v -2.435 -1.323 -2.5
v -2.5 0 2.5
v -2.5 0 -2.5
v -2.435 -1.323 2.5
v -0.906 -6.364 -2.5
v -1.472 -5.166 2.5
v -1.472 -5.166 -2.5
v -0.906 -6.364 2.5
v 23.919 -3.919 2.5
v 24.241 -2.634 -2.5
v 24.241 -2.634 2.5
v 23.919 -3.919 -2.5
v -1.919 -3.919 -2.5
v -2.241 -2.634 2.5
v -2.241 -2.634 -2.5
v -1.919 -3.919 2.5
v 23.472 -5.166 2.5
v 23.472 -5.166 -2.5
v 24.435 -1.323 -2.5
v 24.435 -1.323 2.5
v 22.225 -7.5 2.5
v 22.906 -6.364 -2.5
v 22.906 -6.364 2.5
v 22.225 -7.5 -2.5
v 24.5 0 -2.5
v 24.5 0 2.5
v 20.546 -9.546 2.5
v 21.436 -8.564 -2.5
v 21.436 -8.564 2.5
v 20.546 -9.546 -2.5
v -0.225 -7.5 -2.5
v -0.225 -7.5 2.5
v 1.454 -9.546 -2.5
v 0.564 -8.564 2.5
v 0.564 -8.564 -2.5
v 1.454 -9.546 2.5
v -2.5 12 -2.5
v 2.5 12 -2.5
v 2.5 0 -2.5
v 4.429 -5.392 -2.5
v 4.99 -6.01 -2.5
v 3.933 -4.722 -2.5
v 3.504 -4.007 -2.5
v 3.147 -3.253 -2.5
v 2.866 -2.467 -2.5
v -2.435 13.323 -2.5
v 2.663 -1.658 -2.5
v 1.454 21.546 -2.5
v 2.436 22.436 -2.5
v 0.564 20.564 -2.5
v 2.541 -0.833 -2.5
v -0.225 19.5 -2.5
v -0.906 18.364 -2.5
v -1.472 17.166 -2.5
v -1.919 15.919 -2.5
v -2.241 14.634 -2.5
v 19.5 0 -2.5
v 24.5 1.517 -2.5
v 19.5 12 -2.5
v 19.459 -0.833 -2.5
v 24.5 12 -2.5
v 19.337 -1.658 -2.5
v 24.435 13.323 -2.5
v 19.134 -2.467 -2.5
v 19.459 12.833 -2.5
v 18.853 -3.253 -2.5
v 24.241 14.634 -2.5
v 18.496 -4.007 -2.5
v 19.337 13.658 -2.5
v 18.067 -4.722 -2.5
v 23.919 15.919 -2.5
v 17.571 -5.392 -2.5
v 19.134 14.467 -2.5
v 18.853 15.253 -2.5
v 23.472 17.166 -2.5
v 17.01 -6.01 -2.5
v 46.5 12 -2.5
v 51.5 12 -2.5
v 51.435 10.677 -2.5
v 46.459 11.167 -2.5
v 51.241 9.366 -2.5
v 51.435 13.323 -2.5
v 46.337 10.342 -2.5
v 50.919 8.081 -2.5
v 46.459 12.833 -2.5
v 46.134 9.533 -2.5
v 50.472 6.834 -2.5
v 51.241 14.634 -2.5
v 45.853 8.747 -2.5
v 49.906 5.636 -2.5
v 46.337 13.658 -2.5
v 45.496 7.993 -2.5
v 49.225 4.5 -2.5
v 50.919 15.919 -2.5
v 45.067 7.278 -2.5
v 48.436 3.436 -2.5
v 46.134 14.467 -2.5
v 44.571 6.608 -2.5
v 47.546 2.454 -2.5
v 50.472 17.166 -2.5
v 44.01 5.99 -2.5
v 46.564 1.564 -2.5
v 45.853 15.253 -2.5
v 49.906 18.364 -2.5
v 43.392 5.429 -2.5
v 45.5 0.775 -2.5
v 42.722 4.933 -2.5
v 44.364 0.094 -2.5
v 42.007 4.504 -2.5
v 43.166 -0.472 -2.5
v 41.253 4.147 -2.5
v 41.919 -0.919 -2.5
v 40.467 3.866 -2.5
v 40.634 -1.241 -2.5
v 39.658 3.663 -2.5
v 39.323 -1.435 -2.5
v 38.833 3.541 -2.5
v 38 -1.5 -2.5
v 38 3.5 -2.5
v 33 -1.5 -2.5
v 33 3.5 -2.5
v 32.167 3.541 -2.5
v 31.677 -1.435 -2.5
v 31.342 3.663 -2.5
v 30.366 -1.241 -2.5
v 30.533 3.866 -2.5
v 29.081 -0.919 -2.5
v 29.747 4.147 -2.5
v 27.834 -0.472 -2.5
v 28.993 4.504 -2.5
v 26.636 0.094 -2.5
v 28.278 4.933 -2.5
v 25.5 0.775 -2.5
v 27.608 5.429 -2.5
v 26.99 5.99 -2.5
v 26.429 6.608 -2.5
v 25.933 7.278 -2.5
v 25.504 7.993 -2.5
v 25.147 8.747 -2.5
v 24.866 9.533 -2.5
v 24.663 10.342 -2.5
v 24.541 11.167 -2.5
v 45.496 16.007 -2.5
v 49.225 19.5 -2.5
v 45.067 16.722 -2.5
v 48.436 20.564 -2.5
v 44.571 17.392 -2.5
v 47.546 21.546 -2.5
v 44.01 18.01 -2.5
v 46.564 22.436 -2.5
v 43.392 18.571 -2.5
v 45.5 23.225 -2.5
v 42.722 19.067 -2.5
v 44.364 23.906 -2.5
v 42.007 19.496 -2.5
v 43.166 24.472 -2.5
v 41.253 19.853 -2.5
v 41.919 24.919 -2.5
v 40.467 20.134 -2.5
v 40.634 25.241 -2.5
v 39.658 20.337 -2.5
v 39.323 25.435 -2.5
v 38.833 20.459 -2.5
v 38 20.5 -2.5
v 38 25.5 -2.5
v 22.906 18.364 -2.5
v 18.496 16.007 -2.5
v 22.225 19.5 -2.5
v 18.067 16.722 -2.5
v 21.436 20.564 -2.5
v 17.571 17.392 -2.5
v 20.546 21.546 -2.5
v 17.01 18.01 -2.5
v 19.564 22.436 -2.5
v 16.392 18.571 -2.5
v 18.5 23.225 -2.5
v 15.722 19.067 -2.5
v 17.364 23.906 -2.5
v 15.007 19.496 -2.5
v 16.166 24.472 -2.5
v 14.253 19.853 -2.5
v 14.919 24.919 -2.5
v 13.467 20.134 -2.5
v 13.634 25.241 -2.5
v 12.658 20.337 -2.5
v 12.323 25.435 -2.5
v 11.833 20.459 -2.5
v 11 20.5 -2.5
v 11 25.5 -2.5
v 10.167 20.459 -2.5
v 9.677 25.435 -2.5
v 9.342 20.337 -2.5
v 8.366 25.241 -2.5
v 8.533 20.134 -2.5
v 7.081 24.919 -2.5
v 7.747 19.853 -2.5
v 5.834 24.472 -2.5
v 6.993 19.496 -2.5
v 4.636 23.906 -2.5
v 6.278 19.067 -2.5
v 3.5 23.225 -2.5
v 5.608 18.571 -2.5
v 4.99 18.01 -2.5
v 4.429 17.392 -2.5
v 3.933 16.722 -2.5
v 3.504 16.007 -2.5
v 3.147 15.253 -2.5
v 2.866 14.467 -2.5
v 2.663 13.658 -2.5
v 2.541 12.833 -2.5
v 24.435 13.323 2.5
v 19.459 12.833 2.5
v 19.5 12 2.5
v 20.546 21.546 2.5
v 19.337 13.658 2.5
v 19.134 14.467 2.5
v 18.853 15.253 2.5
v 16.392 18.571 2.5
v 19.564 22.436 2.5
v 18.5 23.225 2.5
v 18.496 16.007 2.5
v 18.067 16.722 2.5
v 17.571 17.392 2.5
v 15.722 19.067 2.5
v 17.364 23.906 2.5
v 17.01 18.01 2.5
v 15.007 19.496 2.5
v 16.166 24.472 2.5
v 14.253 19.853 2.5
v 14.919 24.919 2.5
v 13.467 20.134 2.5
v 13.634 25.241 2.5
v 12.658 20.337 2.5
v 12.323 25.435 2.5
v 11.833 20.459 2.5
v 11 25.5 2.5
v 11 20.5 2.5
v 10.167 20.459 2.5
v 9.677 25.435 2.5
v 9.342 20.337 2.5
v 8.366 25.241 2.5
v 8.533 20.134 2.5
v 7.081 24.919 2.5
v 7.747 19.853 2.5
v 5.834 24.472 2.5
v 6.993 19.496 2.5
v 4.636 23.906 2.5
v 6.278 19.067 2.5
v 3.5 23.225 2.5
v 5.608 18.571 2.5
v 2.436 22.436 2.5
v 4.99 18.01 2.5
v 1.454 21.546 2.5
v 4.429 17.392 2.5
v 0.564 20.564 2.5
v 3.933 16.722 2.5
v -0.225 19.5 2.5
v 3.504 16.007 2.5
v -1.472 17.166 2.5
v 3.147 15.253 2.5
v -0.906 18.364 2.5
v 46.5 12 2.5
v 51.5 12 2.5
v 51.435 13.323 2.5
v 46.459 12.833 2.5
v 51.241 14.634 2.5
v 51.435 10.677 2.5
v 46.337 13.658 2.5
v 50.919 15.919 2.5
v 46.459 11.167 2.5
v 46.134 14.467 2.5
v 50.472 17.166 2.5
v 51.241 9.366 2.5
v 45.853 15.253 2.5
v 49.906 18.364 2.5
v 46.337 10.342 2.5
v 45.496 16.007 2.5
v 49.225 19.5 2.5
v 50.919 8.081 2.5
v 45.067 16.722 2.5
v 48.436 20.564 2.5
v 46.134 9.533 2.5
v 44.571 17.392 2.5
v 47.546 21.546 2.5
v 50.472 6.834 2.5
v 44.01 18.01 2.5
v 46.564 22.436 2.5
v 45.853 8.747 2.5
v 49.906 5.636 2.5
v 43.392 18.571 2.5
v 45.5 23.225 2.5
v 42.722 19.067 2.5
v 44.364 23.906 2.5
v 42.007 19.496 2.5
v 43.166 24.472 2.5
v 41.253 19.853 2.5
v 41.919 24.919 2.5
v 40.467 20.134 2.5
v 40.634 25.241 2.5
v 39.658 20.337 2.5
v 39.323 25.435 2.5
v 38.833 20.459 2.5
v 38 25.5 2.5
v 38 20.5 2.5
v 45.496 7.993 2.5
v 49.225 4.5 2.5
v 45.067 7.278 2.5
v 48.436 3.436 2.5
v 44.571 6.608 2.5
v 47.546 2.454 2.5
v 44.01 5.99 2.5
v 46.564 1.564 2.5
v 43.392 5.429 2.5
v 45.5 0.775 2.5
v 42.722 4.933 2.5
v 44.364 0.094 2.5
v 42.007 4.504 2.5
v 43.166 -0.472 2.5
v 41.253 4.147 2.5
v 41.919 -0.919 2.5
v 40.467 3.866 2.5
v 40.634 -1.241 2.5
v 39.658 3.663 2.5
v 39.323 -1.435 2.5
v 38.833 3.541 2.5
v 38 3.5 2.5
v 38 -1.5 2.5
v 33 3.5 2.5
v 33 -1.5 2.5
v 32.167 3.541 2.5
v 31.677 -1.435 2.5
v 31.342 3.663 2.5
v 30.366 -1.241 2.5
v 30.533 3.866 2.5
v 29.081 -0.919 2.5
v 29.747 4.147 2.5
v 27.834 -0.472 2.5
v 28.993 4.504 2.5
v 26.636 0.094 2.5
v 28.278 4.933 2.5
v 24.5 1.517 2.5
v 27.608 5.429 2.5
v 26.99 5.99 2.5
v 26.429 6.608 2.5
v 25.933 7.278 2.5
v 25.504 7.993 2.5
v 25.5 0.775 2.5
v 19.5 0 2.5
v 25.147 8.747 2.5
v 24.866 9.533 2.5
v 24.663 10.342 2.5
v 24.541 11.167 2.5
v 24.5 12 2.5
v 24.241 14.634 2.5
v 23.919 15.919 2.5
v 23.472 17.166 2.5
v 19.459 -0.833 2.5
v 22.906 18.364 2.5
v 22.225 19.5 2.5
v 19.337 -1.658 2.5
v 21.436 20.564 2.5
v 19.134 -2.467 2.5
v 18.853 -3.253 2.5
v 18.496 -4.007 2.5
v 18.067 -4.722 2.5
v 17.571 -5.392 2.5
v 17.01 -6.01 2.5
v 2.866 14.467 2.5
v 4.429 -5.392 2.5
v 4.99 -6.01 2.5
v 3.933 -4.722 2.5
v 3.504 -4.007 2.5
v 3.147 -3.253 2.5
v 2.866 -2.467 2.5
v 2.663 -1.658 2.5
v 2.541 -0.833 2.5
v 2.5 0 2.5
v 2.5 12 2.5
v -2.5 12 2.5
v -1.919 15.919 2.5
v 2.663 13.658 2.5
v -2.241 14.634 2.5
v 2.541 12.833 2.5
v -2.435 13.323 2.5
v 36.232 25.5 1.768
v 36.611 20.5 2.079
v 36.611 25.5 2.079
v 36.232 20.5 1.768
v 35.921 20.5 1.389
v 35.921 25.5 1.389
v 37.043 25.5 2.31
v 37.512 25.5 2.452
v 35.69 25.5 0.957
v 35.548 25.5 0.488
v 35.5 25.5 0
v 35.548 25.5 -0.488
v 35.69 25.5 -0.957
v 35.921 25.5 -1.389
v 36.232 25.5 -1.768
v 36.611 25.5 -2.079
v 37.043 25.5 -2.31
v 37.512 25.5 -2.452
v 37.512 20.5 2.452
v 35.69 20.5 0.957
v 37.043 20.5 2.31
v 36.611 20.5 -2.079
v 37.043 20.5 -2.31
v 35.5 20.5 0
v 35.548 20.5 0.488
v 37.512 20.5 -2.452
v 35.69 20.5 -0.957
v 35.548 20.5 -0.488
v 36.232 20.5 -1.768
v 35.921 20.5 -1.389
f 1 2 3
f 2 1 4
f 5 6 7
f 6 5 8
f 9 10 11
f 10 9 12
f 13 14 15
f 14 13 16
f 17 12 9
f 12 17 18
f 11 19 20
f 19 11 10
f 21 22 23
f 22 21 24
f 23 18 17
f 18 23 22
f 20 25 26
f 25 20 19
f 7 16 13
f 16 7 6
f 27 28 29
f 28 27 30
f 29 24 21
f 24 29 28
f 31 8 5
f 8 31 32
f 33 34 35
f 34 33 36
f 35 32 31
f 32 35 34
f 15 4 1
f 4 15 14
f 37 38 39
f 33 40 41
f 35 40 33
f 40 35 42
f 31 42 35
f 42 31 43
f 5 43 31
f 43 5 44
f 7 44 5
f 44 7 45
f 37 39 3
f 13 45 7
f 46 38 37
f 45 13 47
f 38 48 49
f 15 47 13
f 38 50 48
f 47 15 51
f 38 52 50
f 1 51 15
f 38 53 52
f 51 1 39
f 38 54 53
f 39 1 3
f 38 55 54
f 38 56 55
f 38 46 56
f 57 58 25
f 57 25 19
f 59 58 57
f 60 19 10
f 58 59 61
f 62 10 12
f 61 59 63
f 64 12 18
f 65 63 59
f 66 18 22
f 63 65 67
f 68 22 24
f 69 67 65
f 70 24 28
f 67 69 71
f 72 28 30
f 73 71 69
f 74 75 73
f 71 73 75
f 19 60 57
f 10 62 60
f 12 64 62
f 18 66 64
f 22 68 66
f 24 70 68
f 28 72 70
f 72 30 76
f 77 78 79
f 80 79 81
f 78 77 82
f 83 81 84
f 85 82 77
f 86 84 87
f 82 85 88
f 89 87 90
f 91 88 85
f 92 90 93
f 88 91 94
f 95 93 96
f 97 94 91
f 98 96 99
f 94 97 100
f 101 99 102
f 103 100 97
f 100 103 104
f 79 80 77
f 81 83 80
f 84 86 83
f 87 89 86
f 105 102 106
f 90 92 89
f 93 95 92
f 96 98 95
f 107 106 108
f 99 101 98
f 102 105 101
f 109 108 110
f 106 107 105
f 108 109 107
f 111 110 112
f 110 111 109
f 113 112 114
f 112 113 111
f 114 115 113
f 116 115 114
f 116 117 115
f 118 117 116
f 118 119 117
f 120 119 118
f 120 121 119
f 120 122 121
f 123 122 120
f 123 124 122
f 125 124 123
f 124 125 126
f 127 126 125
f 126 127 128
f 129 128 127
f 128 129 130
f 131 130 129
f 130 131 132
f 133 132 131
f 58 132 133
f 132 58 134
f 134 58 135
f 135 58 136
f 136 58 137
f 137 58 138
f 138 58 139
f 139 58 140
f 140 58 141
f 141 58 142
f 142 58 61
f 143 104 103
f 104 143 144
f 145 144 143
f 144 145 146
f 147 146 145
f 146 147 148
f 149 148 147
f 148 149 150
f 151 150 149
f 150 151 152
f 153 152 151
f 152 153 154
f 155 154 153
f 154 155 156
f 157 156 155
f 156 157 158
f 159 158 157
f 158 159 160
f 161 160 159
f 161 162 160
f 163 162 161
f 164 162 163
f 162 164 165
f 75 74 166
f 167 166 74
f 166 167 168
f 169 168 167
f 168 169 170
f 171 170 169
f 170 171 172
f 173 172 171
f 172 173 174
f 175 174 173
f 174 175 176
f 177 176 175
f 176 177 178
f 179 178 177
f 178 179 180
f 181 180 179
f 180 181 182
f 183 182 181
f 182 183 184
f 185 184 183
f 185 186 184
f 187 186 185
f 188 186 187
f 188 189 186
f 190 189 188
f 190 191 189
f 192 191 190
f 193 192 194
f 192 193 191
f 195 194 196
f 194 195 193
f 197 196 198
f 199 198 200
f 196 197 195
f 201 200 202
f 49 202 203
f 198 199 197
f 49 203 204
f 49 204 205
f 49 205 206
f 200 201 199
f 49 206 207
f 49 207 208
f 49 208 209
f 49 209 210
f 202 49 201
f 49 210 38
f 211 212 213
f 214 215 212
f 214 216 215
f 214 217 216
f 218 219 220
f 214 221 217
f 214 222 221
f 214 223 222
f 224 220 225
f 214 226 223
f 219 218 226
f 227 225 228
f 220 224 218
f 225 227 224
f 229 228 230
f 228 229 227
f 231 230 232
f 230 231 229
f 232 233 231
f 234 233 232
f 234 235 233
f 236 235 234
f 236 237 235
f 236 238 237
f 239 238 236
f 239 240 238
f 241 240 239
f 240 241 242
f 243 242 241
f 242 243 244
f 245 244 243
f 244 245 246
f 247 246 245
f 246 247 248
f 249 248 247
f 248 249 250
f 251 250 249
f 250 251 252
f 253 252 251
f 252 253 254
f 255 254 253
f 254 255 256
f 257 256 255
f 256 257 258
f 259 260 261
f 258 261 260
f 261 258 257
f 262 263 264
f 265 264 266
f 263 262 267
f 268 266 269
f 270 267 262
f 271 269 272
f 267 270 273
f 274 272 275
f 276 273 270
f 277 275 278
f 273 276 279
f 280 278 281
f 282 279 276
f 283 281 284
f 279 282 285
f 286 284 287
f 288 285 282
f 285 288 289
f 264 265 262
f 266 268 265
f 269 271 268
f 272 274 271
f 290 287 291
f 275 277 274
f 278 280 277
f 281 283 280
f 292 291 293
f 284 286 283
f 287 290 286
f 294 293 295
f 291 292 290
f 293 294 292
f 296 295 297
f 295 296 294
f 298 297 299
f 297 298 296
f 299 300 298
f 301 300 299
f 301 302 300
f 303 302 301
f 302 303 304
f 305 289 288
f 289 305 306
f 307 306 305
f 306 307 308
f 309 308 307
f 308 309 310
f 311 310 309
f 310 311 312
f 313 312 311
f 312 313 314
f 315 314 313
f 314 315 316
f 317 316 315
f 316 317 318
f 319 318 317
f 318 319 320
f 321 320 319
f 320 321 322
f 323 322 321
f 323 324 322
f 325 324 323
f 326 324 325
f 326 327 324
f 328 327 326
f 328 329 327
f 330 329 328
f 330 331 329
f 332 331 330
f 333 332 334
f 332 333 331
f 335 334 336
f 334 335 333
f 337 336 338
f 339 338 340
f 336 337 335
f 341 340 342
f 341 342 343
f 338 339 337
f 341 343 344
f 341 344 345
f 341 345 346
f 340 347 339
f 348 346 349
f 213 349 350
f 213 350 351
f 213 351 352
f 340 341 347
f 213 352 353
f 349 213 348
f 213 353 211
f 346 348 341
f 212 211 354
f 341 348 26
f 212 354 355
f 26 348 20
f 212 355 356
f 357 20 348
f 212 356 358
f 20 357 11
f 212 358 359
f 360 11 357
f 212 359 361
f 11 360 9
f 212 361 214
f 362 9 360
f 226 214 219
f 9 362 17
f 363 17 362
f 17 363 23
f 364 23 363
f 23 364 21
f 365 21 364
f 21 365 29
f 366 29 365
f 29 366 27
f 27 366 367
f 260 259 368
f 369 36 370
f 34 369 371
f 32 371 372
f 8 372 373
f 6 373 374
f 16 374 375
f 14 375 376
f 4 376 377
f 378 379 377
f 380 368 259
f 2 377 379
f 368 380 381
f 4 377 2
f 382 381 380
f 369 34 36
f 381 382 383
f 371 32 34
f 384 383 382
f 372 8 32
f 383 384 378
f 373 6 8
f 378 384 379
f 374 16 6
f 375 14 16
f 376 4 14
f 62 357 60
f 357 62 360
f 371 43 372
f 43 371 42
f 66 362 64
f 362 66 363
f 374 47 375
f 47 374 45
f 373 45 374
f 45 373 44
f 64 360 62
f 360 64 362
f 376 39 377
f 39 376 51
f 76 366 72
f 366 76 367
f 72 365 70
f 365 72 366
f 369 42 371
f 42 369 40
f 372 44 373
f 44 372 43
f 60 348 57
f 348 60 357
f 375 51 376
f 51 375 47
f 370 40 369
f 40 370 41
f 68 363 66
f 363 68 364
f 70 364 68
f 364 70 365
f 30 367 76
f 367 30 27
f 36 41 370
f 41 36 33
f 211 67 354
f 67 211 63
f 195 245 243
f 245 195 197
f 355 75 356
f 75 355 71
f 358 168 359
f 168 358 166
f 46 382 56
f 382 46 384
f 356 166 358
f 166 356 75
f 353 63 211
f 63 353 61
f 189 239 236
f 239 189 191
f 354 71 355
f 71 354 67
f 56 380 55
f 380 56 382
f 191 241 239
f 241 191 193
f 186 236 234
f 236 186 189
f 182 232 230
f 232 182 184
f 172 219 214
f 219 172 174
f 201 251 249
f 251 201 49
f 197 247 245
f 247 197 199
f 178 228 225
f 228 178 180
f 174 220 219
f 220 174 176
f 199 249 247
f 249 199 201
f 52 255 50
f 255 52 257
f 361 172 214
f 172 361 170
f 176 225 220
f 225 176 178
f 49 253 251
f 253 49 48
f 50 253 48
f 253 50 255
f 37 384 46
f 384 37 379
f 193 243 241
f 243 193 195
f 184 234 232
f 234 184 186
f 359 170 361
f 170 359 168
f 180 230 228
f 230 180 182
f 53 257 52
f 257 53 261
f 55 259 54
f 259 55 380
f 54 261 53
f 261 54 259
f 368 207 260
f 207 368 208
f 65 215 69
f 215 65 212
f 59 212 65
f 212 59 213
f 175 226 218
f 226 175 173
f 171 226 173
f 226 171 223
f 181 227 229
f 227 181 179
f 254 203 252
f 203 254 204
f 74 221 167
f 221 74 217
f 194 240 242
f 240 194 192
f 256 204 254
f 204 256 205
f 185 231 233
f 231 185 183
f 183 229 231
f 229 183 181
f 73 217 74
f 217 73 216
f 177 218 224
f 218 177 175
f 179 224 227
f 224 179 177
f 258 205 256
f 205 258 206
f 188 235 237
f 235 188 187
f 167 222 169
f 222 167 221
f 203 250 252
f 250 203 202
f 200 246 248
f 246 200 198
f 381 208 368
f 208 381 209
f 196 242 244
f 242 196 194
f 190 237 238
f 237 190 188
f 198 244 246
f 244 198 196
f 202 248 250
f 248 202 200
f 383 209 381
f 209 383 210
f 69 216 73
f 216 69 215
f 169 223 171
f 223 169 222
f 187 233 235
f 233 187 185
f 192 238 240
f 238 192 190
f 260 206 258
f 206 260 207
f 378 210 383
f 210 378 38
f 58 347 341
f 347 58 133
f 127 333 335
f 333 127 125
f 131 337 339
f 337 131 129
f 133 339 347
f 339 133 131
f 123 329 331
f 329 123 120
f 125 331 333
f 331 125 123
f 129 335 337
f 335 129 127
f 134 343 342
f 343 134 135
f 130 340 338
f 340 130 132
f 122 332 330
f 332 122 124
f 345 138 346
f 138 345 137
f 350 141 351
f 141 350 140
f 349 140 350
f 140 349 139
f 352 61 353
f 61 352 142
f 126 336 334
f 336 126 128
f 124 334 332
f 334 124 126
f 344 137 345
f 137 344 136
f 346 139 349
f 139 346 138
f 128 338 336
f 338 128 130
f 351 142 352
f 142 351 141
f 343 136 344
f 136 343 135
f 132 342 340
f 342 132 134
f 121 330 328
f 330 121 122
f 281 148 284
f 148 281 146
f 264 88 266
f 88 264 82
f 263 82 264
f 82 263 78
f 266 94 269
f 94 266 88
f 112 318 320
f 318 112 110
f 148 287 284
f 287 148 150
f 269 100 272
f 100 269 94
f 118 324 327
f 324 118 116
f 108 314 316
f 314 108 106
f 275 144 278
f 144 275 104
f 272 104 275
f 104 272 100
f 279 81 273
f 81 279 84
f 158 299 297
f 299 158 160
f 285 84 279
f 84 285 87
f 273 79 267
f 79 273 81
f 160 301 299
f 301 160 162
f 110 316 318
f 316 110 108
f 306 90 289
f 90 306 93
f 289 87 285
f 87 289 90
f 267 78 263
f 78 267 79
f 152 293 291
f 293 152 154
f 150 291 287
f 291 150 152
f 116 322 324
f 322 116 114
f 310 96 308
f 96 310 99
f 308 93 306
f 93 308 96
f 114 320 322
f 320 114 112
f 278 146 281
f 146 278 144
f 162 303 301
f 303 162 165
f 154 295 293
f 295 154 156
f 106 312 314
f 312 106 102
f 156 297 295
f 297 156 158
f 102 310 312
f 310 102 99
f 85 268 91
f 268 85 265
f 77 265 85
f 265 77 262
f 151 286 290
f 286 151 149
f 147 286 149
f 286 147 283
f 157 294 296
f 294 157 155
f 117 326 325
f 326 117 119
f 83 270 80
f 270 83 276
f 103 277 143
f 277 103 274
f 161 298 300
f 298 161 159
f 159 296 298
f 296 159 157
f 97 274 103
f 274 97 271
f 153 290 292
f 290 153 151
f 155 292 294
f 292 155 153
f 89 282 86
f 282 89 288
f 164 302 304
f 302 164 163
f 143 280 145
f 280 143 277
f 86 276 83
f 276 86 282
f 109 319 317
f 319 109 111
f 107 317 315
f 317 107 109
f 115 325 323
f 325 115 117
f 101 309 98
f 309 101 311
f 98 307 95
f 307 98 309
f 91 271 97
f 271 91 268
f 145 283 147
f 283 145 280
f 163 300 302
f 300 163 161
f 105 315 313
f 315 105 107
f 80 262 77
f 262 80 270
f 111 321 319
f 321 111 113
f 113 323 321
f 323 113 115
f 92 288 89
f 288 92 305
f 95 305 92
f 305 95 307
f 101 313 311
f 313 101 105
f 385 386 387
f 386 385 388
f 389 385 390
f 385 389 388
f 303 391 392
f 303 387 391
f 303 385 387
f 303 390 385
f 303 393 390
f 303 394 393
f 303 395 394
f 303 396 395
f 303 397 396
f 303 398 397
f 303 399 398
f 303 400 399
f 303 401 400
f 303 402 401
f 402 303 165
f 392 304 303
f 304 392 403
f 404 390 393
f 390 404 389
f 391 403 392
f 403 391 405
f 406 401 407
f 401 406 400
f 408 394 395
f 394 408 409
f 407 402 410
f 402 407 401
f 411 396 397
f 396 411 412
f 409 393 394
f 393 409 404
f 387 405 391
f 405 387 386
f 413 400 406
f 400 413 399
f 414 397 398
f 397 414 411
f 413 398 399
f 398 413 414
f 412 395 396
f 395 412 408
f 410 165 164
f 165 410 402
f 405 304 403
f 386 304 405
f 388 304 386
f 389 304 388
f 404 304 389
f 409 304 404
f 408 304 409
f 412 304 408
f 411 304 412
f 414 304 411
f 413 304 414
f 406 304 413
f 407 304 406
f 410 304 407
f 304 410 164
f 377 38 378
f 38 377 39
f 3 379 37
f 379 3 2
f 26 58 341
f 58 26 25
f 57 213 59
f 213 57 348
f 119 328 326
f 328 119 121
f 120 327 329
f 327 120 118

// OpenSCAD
W = 17;
L = 29;
thickness = 5;
height = 5;
gap = 0.1;

$fn=64;

diameter = W+2*thickness;
cube_wg = diameter+gap;
cube_dg = diameter+gap;
cube_hg = height+gap;


s1w = L-W/2;

union(){
	
    translate([W/2+thickness/2,,0]){
		difference(){
		    cylinder(h=height, d=diameter, center=true);
		    cylinder(h=height+gap, d=W, center=true);
			translate([0,cube_dg/2,0]){
				cube([cube_wg,cube_dg,cube_hg],center=true);
			}
			translate([0,-cube_dg/2*sqrt(2),0]){
                rotate(a=45,v=[0,0,1]){
				    #cube([cube_wg,cube_dg,cube_hg],center=true);
                }
			}
		}
	}

    translate([0,(L-W)/2,0]){
	    cube([thickness,L-W,height], center=true);
    }

	translate([diameter/2-thickness/2,(L-W),0]){
		difference(){
		    cylinder(h=height, d=diameter, center=true);
		    cylinder(h=height+gap, d=W, center=true);
			translate([0,-cube_dg/2,0]){
				cube([cube_wg,cube_dg,cube_hg],center=true);
			}
		}
	}
    
    translate([W+thickness/2+thickness/2,(L-W)/2,0]){
		cube([thickness,L-W,height], center=true);
	}

	section_w = 2;

	hook_d = diameter/2-thickness/2+diameter-thickness;

	translate([hook_d,L-W,0]){
		difference(){
		    cylinder(h=height, d=diameter, center=true);
		    cylinder(h=height+gap, d=W, center=true);
			translate([0,cube_dg/2,0]){
				cube([cube_wg,cube_dg,cube_hg],center=true);
			}
			translate([cube_dg/2,0,0]){
				cube([cube_wg,cube_dg,cube_hg],center=true);
			}
		}
	}

	section_h = height;
	translate([hook_d+section_h/2,L-W-diameter/2+thickness/2,0]){
		cube([section_h,thickness,height], center=true);
	}

	translate([hook_d+section_h,L-W,0]){
		difference(){
		    cylinder(h=height, d=diameter, center=true);
		    cylinder(h=height+gap, d=W, center=true);
			translate([0,cube_dg/2,0]){
				cube([-cube_wg,cube_dg,cube_hg],center=true);
			}
			translate([-cube_dg/2,0,0]){
				cube([cube_wg,cube_dg,cube_hg],center=true);
			}
		}
	}

	translate([hook_d+section_h,L-W+W/2+thickness/2,0]){
		rotate(a=90,v=[1,0,0]){
			difference(){
			    cylinder(h=thickness, d=height, center=true, $fn=32);
				translate([cube_dg/2,0,0]){
					cube([cube_wg,cube_dg,cube_hg],center=true);
				}
		    }
		}
	}
}
